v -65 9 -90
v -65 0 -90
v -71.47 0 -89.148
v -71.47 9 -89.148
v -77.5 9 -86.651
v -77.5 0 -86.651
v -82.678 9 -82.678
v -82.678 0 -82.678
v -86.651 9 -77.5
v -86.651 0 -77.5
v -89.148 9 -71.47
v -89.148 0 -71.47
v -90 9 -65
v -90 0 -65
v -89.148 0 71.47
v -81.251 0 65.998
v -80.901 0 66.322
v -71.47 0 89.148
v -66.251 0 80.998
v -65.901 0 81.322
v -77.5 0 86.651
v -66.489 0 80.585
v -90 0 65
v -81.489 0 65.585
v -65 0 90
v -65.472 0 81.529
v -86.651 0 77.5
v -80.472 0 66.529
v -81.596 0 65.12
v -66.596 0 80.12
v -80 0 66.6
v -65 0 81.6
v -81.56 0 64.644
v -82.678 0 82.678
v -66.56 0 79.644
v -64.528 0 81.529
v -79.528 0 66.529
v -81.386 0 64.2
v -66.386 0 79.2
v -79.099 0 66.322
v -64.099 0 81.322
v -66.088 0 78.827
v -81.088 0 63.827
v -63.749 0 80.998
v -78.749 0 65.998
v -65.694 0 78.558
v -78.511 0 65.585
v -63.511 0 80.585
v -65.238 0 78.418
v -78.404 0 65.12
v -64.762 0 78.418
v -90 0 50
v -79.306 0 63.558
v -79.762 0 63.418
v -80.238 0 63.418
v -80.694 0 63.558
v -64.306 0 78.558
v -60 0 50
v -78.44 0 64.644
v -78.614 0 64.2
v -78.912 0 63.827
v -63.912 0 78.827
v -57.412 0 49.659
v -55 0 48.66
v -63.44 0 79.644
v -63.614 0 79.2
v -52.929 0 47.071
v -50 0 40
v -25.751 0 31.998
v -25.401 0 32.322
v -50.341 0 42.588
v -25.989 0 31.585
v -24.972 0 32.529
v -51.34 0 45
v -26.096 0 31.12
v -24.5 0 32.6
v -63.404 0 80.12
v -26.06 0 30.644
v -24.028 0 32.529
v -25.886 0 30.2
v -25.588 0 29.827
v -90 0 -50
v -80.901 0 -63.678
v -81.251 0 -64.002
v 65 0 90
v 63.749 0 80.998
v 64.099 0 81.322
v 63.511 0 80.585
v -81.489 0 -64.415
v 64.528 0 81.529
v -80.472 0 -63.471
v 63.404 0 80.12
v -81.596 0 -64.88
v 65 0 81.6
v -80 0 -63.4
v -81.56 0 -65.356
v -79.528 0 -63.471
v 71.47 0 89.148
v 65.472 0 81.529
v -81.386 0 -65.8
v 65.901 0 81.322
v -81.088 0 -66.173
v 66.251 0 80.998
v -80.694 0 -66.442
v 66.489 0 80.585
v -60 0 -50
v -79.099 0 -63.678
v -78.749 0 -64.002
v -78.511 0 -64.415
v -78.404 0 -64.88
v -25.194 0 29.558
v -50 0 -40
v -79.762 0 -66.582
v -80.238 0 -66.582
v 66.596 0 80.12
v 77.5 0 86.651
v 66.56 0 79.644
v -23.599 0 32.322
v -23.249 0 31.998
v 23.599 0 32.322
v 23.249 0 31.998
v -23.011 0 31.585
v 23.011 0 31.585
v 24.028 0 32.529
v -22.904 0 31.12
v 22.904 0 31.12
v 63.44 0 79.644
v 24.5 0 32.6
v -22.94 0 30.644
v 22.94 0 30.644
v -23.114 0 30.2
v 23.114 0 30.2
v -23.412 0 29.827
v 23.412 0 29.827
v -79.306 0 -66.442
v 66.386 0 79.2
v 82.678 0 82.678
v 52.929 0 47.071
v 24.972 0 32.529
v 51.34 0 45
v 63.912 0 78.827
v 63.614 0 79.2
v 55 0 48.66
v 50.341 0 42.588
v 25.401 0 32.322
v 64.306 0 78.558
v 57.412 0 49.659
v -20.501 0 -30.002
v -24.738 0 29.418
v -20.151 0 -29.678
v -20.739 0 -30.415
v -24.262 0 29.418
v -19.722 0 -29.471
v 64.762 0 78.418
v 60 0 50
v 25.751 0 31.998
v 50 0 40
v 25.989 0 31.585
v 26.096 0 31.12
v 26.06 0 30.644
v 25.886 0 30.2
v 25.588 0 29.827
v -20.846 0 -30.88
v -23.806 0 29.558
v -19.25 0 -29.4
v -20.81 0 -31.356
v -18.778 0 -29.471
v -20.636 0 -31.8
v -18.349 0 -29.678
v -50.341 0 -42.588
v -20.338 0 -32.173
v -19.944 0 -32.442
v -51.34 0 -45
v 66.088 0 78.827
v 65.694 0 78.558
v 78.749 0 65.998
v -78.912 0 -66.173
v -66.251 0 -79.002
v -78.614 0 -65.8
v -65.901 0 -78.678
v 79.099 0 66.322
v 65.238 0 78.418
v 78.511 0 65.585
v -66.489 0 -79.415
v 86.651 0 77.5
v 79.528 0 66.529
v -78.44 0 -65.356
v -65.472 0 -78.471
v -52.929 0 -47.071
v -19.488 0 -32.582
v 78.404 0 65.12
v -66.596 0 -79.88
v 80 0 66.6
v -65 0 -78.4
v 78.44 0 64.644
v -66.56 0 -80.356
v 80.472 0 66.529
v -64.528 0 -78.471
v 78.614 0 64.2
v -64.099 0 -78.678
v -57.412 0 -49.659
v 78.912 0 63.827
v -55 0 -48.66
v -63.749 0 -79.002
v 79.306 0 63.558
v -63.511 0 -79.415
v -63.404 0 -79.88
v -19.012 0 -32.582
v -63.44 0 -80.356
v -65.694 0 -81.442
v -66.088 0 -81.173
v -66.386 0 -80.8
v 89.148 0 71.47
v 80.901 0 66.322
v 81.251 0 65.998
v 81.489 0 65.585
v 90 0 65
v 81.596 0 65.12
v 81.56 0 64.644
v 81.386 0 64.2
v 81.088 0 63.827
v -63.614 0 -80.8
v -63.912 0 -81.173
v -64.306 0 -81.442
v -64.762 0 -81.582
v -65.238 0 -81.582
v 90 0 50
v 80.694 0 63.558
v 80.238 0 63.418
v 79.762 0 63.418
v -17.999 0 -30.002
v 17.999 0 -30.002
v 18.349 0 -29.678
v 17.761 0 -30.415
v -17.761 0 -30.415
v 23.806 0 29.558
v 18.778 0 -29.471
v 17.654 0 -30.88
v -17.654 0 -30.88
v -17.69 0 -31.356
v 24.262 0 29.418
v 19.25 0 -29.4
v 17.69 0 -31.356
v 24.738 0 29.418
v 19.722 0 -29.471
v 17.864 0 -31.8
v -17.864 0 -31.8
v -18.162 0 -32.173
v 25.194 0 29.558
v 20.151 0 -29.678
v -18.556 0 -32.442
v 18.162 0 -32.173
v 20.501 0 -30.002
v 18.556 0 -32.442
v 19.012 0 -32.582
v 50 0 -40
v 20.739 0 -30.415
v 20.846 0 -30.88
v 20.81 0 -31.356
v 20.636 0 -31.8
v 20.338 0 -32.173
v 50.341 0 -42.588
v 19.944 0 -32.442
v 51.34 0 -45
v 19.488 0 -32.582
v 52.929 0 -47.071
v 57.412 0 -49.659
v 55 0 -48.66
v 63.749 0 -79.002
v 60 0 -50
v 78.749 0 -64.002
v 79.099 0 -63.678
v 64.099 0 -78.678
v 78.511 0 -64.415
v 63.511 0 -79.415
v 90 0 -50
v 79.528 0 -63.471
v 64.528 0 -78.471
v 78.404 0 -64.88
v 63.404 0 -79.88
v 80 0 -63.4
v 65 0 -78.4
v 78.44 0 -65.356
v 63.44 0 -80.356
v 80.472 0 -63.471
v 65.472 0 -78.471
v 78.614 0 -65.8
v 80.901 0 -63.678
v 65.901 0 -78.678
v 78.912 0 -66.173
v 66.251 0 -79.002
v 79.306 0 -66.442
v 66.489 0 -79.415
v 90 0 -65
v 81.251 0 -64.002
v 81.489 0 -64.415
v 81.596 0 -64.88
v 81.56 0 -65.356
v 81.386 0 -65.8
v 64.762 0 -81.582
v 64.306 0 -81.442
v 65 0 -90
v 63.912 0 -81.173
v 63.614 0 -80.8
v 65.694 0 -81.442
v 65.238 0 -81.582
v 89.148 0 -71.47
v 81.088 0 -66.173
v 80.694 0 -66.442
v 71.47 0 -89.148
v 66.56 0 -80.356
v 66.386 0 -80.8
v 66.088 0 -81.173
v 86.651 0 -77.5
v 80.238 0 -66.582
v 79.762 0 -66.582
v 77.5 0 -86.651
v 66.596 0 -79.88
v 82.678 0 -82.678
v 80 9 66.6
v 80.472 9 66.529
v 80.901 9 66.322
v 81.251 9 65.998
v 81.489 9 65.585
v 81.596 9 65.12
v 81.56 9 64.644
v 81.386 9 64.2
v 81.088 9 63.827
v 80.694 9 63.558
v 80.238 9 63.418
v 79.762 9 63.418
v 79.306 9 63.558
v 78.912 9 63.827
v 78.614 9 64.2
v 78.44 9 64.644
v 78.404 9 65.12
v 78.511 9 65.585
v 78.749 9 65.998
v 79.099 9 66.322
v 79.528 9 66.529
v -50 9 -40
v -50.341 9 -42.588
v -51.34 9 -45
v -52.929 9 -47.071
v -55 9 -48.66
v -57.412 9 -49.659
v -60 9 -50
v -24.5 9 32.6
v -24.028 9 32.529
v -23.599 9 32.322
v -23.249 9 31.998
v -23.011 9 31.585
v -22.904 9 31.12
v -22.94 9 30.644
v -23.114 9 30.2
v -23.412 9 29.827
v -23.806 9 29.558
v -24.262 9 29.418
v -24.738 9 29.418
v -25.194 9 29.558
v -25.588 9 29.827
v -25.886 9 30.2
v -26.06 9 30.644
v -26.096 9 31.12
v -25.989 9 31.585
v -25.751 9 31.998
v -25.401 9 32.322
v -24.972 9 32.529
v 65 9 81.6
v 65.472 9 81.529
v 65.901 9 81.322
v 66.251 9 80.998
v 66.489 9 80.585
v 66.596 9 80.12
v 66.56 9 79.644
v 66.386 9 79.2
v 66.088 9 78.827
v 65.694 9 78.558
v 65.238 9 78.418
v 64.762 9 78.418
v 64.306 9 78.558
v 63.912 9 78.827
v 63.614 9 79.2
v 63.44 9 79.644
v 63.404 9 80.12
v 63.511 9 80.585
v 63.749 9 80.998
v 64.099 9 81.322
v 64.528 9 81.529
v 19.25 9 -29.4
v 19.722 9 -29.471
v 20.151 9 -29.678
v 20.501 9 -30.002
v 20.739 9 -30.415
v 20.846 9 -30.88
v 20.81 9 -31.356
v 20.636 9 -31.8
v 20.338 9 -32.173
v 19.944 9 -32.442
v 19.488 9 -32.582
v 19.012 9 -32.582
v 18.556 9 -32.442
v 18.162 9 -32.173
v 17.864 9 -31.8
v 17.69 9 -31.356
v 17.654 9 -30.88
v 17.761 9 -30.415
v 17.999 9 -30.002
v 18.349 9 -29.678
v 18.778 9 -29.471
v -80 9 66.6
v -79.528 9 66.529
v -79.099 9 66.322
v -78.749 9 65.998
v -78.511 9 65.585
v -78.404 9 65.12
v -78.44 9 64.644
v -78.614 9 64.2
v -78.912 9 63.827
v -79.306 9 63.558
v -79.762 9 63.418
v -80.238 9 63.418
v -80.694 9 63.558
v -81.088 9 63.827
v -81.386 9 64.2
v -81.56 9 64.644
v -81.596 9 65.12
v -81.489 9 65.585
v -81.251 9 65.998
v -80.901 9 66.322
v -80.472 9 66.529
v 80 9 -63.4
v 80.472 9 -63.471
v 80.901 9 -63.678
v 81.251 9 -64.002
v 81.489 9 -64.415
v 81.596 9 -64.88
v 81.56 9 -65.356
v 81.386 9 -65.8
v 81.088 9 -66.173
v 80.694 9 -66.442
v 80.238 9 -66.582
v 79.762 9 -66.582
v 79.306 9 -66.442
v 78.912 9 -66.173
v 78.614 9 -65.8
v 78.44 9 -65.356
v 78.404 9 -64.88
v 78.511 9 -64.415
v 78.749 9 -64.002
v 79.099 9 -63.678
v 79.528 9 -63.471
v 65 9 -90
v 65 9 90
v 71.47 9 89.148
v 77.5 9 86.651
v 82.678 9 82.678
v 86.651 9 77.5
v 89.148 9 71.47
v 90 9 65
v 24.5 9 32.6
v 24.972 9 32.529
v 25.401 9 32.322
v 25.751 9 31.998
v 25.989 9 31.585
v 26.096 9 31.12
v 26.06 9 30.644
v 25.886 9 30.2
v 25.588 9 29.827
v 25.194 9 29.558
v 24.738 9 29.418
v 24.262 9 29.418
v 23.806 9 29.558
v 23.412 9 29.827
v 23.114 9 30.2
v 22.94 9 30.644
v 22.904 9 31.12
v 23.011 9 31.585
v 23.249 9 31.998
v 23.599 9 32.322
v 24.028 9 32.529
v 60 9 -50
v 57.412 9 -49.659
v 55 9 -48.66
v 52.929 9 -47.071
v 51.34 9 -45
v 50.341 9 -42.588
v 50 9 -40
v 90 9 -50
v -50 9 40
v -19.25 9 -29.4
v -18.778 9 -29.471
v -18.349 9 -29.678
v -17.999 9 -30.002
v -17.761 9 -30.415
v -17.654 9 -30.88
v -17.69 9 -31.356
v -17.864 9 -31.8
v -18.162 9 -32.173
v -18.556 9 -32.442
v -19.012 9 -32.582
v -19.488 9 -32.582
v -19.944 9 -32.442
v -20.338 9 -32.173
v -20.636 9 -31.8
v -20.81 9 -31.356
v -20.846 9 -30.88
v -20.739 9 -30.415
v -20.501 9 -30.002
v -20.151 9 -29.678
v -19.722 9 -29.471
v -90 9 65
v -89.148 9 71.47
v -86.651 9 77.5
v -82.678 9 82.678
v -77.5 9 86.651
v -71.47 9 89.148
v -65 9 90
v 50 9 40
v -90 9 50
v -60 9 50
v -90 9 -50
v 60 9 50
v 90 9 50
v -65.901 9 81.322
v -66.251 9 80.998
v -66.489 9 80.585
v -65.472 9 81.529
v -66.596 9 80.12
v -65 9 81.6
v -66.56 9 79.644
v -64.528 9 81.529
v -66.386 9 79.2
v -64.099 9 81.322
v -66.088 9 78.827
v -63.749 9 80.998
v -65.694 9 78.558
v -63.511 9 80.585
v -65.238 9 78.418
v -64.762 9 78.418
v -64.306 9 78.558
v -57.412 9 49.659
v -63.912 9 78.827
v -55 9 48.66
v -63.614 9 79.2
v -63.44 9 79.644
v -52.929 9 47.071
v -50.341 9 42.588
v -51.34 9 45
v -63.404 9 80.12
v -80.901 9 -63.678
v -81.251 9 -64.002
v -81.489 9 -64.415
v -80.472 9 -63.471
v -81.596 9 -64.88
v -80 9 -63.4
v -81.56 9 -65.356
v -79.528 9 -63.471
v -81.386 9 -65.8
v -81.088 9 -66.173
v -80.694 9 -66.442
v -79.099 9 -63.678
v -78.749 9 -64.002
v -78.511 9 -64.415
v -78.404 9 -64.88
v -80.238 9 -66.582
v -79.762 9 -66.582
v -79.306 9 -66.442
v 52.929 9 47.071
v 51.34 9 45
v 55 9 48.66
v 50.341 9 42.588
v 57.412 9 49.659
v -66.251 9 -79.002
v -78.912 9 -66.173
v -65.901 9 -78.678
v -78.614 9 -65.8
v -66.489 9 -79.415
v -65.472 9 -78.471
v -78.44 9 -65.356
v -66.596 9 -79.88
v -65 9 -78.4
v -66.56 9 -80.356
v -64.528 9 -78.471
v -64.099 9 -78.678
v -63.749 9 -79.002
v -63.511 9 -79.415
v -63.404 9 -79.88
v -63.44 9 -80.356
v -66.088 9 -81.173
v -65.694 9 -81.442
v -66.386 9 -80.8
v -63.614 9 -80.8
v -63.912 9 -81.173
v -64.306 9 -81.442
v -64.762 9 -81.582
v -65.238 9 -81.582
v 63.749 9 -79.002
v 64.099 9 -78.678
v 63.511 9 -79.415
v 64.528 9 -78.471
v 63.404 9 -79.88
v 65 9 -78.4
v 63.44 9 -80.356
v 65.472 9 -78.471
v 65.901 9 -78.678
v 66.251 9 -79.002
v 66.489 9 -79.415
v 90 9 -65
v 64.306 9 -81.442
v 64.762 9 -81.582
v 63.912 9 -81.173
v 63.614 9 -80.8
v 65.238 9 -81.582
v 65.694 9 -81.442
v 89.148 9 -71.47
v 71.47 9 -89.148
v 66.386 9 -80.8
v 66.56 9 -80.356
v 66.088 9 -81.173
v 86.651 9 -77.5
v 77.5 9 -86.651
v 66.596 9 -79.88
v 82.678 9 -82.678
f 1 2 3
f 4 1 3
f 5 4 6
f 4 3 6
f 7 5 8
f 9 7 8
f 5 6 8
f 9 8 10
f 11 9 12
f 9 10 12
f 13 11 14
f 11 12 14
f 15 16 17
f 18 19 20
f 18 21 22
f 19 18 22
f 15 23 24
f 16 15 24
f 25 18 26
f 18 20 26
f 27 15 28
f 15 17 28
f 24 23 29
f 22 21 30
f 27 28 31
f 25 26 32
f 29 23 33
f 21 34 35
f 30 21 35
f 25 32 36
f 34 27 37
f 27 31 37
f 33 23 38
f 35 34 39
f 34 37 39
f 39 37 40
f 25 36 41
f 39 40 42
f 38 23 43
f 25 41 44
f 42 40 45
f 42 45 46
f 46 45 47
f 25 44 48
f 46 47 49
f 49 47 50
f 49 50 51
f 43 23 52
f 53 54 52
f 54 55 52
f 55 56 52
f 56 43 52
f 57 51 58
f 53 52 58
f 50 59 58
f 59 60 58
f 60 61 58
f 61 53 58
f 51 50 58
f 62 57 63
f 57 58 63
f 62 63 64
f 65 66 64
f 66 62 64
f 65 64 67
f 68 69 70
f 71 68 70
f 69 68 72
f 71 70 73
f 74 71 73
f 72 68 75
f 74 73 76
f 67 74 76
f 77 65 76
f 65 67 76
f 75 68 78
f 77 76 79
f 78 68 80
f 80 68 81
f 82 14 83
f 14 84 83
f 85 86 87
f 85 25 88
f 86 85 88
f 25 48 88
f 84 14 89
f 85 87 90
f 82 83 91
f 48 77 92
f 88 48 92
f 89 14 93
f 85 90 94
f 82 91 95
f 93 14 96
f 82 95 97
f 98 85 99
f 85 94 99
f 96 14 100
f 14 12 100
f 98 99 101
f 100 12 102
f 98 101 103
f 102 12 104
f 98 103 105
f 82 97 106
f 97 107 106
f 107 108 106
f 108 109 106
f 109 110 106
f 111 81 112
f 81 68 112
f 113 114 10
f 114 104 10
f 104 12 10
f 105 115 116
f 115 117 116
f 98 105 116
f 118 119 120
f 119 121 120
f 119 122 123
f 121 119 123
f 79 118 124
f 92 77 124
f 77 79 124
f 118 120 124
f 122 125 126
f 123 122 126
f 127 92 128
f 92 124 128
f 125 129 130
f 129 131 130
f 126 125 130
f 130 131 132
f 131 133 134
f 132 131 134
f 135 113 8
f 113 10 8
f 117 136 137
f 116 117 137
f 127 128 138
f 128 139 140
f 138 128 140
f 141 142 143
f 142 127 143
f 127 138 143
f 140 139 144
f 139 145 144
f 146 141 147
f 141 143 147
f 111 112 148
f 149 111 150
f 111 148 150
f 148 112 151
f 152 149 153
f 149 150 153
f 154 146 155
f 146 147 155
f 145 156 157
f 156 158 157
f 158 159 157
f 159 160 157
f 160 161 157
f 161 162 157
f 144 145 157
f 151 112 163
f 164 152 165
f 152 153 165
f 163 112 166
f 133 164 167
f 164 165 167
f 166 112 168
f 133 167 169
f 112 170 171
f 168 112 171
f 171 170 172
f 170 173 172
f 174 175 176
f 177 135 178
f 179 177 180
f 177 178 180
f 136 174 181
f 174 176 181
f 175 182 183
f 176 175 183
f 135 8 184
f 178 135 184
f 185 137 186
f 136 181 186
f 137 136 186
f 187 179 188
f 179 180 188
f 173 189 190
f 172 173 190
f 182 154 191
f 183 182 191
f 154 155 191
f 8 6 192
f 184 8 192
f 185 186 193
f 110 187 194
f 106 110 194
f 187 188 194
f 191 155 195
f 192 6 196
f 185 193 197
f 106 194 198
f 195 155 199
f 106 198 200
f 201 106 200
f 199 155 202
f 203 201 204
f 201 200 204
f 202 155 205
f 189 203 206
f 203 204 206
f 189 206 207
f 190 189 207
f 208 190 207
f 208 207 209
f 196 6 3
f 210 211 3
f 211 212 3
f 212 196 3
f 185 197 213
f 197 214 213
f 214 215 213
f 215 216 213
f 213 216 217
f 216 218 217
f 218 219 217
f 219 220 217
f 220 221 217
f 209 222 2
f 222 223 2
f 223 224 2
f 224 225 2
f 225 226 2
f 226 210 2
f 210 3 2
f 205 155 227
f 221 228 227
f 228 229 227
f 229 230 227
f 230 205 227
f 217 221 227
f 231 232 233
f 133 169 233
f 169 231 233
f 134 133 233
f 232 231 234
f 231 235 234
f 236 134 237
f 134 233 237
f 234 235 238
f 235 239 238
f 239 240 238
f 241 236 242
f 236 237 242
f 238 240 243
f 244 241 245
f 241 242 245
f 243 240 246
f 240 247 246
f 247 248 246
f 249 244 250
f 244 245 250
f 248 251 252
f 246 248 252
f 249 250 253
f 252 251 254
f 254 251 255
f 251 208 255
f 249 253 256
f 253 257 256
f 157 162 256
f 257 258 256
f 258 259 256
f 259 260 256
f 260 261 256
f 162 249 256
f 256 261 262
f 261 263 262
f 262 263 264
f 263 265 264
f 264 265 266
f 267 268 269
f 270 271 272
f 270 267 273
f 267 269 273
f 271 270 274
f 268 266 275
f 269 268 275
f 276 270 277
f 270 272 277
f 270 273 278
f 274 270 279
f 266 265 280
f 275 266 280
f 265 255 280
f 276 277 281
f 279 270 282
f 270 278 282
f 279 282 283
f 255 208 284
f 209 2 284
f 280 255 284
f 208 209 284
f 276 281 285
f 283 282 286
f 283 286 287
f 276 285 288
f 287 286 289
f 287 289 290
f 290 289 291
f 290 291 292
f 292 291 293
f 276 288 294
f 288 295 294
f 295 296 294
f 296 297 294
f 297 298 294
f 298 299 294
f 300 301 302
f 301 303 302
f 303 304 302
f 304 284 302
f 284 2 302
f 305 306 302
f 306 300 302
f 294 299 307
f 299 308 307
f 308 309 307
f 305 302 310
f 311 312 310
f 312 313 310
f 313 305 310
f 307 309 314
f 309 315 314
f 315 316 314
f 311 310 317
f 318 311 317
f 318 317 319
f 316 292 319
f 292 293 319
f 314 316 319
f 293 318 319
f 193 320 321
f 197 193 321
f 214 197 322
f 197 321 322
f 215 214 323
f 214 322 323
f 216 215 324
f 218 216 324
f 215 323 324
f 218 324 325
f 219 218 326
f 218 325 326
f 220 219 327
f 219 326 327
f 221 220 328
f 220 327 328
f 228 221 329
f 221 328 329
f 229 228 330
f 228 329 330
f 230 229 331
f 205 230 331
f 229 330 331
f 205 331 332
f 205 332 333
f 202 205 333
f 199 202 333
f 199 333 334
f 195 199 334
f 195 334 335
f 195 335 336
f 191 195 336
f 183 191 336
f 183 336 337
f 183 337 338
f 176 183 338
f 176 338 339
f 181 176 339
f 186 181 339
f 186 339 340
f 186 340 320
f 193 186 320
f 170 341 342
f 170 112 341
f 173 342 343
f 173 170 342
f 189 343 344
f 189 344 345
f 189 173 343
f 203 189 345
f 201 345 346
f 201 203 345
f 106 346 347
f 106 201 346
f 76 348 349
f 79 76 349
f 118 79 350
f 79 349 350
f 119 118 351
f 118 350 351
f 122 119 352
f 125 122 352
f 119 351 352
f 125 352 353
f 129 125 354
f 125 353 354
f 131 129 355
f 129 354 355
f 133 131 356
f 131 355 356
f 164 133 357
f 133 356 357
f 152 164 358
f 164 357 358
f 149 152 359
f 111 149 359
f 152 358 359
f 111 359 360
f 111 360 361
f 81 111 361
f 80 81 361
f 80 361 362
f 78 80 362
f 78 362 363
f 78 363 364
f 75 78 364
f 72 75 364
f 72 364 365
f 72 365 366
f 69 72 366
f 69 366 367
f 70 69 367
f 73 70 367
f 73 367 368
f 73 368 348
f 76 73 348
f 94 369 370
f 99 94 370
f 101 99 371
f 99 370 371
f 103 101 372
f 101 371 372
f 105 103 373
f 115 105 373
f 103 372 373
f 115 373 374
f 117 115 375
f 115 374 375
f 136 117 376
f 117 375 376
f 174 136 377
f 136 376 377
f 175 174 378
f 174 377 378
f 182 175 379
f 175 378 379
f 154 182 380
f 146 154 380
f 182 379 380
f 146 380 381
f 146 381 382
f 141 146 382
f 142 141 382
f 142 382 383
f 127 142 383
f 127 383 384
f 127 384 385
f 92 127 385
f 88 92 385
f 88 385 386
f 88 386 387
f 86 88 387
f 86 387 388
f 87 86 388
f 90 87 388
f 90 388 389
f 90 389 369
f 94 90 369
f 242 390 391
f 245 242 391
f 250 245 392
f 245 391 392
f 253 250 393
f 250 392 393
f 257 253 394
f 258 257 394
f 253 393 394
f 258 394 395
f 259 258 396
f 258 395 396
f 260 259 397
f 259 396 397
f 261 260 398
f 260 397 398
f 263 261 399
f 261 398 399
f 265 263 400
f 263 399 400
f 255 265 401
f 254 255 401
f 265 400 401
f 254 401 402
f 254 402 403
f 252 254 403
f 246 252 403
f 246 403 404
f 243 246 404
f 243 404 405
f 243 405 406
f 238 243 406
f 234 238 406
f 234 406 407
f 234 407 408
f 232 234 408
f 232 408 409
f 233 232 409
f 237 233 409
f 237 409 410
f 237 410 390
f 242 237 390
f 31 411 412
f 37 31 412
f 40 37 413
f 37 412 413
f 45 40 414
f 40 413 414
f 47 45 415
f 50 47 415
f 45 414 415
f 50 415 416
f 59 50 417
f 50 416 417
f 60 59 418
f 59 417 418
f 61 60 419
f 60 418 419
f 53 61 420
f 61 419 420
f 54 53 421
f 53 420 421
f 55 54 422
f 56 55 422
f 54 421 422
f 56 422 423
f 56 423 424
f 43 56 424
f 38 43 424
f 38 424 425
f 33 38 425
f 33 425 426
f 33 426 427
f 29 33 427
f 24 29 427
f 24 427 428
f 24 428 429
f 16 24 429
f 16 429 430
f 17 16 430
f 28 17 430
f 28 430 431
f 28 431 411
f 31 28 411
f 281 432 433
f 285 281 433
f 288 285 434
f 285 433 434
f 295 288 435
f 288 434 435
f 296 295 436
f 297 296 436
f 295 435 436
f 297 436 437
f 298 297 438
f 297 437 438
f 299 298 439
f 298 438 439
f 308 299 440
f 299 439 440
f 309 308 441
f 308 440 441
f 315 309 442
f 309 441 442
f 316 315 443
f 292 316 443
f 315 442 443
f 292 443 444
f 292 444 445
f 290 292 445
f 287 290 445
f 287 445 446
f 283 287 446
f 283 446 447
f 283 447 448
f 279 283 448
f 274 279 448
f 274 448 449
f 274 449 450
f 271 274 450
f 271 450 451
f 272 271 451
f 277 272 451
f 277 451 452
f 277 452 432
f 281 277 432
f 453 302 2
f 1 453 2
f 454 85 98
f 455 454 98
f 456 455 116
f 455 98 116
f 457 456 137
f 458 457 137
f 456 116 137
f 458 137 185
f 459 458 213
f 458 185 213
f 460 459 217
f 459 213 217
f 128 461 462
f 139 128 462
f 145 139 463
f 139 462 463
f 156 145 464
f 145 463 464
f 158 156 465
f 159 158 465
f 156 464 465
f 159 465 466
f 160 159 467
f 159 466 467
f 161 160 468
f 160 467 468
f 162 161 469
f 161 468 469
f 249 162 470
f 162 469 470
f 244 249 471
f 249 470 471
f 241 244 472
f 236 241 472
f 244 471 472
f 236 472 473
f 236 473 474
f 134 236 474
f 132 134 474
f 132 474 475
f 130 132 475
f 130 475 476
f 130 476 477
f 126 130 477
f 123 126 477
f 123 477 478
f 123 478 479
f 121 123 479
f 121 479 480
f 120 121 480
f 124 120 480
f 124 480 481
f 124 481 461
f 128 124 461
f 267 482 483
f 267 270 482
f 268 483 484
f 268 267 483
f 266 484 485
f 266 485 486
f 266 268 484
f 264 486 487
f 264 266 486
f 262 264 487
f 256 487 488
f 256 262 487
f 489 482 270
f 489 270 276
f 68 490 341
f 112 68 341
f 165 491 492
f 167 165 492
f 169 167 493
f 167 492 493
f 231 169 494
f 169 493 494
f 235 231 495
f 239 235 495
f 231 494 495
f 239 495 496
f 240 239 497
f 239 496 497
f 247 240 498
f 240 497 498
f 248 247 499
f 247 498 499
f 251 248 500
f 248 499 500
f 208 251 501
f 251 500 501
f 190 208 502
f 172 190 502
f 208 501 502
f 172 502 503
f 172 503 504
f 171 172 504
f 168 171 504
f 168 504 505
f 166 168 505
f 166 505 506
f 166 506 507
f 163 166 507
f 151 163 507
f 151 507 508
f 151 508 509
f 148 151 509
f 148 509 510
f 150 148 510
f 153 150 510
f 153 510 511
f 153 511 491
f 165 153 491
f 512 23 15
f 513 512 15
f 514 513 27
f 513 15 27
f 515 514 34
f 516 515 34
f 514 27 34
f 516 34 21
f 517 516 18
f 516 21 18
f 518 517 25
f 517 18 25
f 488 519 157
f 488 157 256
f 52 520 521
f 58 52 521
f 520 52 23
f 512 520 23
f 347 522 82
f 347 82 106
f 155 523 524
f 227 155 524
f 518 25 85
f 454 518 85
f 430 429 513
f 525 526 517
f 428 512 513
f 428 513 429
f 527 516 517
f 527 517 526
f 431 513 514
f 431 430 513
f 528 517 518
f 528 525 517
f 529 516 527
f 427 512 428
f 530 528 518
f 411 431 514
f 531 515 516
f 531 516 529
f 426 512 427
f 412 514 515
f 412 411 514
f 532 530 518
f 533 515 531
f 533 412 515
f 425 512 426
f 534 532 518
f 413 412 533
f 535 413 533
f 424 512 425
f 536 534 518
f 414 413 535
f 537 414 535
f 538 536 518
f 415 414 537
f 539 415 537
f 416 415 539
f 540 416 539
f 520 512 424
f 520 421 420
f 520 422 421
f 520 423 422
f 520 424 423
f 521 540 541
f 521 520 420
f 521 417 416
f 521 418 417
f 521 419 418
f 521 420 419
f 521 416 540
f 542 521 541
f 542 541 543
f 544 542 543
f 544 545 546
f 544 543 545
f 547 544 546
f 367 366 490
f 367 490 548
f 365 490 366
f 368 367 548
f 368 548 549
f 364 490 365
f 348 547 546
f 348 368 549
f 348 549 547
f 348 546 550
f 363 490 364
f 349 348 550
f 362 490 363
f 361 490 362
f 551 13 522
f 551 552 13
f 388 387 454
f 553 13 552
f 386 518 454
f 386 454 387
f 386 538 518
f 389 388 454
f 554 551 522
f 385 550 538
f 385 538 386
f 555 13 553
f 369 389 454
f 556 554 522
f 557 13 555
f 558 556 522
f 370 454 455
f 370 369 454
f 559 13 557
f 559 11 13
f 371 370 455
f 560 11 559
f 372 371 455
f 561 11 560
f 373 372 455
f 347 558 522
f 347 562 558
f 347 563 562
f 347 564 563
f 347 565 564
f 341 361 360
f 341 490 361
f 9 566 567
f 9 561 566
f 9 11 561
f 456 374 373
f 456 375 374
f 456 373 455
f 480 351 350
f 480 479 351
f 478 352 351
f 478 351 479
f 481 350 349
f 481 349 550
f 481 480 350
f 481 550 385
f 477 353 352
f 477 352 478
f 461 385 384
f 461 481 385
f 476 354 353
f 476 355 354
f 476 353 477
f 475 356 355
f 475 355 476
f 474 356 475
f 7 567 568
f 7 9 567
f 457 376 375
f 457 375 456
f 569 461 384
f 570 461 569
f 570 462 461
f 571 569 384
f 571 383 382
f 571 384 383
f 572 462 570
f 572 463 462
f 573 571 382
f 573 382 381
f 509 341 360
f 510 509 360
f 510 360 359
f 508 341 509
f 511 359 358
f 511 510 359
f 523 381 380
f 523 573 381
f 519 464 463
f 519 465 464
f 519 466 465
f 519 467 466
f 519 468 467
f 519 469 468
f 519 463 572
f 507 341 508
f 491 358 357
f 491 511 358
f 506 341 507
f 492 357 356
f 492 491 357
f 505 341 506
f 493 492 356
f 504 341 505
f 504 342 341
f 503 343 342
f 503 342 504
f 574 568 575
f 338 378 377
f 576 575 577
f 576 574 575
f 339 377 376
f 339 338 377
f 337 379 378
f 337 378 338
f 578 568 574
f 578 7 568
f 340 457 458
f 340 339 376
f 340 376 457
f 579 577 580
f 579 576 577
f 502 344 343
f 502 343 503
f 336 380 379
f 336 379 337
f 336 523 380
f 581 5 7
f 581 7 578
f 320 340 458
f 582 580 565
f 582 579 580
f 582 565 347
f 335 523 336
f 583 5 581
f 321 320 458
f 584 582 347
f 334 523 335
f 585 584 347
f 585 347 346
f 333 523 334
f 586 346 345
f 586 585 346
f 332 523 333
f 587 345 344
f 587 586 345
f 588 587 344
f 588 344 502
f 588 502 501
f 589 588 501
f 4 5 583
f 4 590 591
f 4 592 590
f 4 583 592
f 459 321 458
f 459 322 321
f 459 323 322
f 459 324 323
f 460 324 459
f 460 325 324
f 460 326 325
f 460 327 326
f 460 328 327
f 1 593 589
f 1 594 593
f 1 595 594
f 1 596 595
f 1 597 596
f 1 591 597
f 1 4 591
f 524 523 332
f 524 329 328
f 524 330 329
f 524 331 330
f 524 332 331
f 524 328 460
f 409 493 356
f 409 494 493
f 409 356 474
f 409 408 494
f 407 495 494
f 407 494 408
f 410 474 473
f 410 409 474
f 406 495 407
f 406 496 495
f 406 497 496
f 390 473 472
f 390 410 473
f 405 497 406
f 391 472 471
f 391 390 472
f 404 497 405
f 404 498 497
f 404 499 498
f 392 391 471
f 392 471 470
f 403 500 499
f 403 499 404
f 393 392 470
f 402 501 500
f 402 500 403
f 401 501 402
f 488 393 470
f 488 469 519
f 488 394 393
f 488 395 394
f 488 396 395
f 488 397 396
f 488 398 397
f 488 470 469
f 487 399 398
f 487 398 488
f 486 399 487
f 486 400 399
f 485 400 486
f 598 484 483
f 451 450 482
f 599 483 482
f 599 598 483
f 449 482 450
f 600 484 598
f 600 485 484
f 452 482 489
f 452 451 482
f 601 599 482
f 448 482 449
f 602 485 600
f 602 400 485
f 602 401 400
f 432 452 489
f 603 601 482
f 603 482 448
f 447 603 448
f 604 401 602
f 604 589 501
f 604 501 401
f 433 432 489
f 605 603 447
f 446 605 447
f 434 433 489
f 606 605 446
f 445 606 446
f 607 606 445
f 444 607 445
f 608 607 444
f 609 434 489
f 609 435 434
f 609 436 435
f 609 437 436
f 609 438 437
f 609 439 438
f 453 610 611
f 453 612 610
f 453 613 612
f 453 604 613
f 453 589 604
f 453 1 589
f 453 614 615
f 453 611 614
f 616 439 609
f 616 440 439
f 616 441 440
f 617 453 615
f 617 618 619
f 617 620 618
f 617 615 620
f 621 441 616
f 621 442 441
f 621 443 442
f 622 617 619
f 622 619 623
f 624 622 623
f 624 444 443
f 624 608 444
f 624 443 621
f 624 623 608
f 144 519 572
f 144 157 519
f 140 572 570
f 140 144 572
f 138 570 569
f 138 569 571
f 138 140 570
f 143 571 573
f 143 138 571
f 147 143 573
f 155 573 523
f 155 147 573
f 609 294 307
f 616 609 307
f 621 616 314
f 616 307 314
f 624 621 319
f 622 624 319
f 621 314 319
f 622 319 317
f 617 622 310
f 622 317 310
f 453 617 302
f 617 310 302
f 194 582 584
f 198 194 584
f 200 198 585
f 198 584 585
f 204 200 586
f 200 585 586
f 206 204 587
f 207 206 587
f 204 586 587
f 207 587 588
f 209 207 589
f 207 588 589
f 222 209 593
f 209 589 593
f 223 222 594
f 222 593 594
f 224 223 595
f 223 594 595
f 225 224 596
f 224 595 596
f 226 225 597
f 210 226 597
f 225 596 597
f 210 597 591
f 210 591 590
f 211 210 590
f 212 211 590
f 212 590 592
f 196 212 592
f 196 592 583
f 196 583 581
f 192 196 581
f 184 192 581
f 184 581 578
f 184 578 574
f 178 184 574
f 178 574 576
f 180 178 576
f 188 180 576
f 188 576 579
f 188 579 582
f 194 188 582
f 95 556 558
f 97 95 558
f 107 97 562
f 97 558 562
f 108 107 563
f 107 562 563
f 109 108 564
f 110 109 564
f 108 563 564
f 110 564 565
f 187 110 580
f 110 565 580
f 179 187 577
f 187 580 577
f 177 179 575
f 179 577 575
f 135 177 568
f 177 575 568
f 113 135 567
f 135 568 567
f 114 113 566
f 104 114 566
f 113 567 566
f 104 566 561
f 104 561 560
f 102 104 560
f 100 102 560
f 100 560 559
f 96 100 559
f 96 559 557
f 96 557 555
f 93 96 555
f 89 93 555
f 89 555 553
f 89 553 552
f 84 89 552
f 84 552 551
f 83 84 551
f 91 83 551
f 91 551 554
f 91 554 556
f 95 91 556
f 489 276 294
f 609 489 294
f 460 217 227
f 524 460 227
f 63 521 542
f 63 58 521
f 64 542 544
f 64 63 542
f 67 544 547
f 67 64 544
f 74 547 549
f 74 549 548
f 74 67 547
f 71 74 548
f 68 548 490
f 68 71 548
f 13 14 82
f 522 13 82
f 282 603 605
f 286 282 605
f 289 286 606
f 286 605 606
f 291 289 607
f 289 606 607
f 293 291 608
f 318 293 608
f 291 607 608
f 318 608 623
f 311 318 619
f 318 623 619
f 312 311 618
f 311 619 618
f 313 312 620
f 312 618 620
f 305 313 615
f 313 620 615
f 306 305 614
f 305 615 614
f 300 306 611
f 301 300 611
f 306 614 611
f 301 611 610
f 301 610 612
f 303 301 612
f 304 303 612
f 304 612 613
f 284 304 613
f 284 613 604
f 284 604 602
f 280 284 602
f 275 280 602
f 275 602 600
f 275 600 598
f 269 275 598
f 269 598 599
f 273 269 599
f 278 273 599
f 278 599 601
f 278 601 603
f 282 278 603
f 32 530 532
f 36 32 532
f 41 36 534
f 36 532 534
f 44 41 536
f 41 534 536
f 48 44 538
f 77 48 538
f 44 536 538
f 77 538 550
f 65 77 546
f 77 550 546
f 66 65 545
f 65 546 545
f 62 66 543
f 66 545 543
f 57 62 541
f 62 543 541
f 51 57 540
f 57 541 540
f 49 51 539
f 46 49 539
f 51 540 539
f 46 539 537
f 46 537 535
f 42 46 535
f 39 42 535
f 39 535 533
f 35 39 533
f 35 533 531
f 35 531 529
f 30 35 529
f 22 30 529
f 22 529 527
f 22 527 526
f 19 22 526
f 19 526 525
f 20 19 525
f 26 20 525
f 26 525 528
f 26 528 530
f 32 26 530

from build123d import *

# Parameters (mm, degrees)
PLATE_DEPTH         = 9
SKETCH3_R           = 1.6
HEX_HOLES_DEPTH     = 128.597021909
SKETCH4_R           = 1.6
ARDUINO_HOLES_DEPTH = 128.597021909
SKETCH5_W           = 40
SKETCH5_H           = 100
CUT_EXTRUDE1_DEPTH  = 128.597021909
FILLET1_R           = 10


with BuildPart() as part:
    # Sketch1 → Plate (new body)
    with BuildSketch(Plane(origin=(0, 0, 0), x_dir=(1, 0, 0), z_dir=(0, 1, 0))):
        with BuildLine():
            Line((-65, -90), (65, -90))
            ThreePointArc((65, -90), (82.67766953, -82.67766953), (90, -65))
            Line((90, -65), (90, 65))
            ThreePointArc((90, 65), (82.67766953, 82.67766953), (65, 90))
            Line((65, 90), (-65, 90))
            ThreePointArc((-65, 90), (-82.67766953, 82.67766953), (-90, 65))
            Line((-90, 65), (-90, -65))
            ThreePointArc((-90, -65), (-82.67766953, -82.67766953), (-65, -90))
        make_face()
    extrude(amount=PLATE_DEPTH)

    # Sketch3 → Hex Holes (cut, through all)
    with BuildSketch(Plane(origin=(0, 9, 0), x_dir=(1, 0, 0), z_dir=(0, 1, 0))):
        with Locations(Location((-65, 80, 0), (0, 0, 270))):
            Circle(SKETCH3_R)
        with Locations(Location((-80, 65, 0), (0, 0, 270))):
            Circle(SKETCH3_R)
        with Locations(Location((80, 65, 0), (0, 0, 270))):
            Circle(SKETCH3_R)
        with Locations(Location((80, -65, 0), (0, 0, 270))):
            Circle(SKETCH3_R)
        with Locations(Location((65, 80, 0), (0, 0, 270))):
            Circle(SKETCH3_R)
        with Locations(Location((65, -80, 0), (0, 0, 270))):
            Circle(SKETCH3_R)
        with Locations(Location((-65, -80, 0), (0, 0, 270))):
            Circle(SKETCH3_R)
        with Locations(Location((-80, -65, 0), (0, 0, 270))):
            Circle(SKETCH3_R)
    extrude(amount=-HEX_HOLES_DEPTH, mode=Mode.SUBTRACT)

    # Sketch4 → Arduino Holes (cut, through all)
    with BuildSketch(Plane(origin=(0, 9, 0), x_dir=(1, 0, 0), z_dir=(0, 1, 0))):
        with Locations(Location((-24.5, -31, 0), (0, 0, 270))):
            Circle(SKETCH4_R)
        with Locations(Location((24.5, -31, 0), (0, 0, 270))):
            Circle(SKETCH4_R)
        with Locations(Location((-19.25, 31, 0), (0, 0, 270))):
            Circle(SKETCH4_R)
        with Locations(Location((19.25, 31, 0), (0, 0, 270))):
            Circle(SKETCH4_R)
    extrude(amount=-ARDUINO_HOLES_DEPTH, mode=Mode.SUBTRACT)

    # Sketch5 → Cut-Extrude1 (cut, through all)
    with BuildSketch(Plane(origin=(0, 9, 0), x_dir=(1, 0, 0), z_dir=(0, 1, 0))):
        with Locations((-70, 0)):
            Rectangle(SKETCH5_W, SKETCH5_H)
        with Locations((70, 0)):
            Rectangle(SKETCH5_W, SKETCH5_H)
    extrude(amount=-CUT_EXTRUDE1_DEPTH, mode=Mode.SUBTRACT)

    # Fillet1
    fillet1_edges = [part.edges().sort_by_distance(p)[0] for p in [
        (50, 4.5, 50),
        (50, 4.5, -50),
        (-50, 4.5, -50),
        (-50, 4.5, 50),
    ]]
    fillet(fillet1_edges, radius=FILLET1_R)


solid = part.part
